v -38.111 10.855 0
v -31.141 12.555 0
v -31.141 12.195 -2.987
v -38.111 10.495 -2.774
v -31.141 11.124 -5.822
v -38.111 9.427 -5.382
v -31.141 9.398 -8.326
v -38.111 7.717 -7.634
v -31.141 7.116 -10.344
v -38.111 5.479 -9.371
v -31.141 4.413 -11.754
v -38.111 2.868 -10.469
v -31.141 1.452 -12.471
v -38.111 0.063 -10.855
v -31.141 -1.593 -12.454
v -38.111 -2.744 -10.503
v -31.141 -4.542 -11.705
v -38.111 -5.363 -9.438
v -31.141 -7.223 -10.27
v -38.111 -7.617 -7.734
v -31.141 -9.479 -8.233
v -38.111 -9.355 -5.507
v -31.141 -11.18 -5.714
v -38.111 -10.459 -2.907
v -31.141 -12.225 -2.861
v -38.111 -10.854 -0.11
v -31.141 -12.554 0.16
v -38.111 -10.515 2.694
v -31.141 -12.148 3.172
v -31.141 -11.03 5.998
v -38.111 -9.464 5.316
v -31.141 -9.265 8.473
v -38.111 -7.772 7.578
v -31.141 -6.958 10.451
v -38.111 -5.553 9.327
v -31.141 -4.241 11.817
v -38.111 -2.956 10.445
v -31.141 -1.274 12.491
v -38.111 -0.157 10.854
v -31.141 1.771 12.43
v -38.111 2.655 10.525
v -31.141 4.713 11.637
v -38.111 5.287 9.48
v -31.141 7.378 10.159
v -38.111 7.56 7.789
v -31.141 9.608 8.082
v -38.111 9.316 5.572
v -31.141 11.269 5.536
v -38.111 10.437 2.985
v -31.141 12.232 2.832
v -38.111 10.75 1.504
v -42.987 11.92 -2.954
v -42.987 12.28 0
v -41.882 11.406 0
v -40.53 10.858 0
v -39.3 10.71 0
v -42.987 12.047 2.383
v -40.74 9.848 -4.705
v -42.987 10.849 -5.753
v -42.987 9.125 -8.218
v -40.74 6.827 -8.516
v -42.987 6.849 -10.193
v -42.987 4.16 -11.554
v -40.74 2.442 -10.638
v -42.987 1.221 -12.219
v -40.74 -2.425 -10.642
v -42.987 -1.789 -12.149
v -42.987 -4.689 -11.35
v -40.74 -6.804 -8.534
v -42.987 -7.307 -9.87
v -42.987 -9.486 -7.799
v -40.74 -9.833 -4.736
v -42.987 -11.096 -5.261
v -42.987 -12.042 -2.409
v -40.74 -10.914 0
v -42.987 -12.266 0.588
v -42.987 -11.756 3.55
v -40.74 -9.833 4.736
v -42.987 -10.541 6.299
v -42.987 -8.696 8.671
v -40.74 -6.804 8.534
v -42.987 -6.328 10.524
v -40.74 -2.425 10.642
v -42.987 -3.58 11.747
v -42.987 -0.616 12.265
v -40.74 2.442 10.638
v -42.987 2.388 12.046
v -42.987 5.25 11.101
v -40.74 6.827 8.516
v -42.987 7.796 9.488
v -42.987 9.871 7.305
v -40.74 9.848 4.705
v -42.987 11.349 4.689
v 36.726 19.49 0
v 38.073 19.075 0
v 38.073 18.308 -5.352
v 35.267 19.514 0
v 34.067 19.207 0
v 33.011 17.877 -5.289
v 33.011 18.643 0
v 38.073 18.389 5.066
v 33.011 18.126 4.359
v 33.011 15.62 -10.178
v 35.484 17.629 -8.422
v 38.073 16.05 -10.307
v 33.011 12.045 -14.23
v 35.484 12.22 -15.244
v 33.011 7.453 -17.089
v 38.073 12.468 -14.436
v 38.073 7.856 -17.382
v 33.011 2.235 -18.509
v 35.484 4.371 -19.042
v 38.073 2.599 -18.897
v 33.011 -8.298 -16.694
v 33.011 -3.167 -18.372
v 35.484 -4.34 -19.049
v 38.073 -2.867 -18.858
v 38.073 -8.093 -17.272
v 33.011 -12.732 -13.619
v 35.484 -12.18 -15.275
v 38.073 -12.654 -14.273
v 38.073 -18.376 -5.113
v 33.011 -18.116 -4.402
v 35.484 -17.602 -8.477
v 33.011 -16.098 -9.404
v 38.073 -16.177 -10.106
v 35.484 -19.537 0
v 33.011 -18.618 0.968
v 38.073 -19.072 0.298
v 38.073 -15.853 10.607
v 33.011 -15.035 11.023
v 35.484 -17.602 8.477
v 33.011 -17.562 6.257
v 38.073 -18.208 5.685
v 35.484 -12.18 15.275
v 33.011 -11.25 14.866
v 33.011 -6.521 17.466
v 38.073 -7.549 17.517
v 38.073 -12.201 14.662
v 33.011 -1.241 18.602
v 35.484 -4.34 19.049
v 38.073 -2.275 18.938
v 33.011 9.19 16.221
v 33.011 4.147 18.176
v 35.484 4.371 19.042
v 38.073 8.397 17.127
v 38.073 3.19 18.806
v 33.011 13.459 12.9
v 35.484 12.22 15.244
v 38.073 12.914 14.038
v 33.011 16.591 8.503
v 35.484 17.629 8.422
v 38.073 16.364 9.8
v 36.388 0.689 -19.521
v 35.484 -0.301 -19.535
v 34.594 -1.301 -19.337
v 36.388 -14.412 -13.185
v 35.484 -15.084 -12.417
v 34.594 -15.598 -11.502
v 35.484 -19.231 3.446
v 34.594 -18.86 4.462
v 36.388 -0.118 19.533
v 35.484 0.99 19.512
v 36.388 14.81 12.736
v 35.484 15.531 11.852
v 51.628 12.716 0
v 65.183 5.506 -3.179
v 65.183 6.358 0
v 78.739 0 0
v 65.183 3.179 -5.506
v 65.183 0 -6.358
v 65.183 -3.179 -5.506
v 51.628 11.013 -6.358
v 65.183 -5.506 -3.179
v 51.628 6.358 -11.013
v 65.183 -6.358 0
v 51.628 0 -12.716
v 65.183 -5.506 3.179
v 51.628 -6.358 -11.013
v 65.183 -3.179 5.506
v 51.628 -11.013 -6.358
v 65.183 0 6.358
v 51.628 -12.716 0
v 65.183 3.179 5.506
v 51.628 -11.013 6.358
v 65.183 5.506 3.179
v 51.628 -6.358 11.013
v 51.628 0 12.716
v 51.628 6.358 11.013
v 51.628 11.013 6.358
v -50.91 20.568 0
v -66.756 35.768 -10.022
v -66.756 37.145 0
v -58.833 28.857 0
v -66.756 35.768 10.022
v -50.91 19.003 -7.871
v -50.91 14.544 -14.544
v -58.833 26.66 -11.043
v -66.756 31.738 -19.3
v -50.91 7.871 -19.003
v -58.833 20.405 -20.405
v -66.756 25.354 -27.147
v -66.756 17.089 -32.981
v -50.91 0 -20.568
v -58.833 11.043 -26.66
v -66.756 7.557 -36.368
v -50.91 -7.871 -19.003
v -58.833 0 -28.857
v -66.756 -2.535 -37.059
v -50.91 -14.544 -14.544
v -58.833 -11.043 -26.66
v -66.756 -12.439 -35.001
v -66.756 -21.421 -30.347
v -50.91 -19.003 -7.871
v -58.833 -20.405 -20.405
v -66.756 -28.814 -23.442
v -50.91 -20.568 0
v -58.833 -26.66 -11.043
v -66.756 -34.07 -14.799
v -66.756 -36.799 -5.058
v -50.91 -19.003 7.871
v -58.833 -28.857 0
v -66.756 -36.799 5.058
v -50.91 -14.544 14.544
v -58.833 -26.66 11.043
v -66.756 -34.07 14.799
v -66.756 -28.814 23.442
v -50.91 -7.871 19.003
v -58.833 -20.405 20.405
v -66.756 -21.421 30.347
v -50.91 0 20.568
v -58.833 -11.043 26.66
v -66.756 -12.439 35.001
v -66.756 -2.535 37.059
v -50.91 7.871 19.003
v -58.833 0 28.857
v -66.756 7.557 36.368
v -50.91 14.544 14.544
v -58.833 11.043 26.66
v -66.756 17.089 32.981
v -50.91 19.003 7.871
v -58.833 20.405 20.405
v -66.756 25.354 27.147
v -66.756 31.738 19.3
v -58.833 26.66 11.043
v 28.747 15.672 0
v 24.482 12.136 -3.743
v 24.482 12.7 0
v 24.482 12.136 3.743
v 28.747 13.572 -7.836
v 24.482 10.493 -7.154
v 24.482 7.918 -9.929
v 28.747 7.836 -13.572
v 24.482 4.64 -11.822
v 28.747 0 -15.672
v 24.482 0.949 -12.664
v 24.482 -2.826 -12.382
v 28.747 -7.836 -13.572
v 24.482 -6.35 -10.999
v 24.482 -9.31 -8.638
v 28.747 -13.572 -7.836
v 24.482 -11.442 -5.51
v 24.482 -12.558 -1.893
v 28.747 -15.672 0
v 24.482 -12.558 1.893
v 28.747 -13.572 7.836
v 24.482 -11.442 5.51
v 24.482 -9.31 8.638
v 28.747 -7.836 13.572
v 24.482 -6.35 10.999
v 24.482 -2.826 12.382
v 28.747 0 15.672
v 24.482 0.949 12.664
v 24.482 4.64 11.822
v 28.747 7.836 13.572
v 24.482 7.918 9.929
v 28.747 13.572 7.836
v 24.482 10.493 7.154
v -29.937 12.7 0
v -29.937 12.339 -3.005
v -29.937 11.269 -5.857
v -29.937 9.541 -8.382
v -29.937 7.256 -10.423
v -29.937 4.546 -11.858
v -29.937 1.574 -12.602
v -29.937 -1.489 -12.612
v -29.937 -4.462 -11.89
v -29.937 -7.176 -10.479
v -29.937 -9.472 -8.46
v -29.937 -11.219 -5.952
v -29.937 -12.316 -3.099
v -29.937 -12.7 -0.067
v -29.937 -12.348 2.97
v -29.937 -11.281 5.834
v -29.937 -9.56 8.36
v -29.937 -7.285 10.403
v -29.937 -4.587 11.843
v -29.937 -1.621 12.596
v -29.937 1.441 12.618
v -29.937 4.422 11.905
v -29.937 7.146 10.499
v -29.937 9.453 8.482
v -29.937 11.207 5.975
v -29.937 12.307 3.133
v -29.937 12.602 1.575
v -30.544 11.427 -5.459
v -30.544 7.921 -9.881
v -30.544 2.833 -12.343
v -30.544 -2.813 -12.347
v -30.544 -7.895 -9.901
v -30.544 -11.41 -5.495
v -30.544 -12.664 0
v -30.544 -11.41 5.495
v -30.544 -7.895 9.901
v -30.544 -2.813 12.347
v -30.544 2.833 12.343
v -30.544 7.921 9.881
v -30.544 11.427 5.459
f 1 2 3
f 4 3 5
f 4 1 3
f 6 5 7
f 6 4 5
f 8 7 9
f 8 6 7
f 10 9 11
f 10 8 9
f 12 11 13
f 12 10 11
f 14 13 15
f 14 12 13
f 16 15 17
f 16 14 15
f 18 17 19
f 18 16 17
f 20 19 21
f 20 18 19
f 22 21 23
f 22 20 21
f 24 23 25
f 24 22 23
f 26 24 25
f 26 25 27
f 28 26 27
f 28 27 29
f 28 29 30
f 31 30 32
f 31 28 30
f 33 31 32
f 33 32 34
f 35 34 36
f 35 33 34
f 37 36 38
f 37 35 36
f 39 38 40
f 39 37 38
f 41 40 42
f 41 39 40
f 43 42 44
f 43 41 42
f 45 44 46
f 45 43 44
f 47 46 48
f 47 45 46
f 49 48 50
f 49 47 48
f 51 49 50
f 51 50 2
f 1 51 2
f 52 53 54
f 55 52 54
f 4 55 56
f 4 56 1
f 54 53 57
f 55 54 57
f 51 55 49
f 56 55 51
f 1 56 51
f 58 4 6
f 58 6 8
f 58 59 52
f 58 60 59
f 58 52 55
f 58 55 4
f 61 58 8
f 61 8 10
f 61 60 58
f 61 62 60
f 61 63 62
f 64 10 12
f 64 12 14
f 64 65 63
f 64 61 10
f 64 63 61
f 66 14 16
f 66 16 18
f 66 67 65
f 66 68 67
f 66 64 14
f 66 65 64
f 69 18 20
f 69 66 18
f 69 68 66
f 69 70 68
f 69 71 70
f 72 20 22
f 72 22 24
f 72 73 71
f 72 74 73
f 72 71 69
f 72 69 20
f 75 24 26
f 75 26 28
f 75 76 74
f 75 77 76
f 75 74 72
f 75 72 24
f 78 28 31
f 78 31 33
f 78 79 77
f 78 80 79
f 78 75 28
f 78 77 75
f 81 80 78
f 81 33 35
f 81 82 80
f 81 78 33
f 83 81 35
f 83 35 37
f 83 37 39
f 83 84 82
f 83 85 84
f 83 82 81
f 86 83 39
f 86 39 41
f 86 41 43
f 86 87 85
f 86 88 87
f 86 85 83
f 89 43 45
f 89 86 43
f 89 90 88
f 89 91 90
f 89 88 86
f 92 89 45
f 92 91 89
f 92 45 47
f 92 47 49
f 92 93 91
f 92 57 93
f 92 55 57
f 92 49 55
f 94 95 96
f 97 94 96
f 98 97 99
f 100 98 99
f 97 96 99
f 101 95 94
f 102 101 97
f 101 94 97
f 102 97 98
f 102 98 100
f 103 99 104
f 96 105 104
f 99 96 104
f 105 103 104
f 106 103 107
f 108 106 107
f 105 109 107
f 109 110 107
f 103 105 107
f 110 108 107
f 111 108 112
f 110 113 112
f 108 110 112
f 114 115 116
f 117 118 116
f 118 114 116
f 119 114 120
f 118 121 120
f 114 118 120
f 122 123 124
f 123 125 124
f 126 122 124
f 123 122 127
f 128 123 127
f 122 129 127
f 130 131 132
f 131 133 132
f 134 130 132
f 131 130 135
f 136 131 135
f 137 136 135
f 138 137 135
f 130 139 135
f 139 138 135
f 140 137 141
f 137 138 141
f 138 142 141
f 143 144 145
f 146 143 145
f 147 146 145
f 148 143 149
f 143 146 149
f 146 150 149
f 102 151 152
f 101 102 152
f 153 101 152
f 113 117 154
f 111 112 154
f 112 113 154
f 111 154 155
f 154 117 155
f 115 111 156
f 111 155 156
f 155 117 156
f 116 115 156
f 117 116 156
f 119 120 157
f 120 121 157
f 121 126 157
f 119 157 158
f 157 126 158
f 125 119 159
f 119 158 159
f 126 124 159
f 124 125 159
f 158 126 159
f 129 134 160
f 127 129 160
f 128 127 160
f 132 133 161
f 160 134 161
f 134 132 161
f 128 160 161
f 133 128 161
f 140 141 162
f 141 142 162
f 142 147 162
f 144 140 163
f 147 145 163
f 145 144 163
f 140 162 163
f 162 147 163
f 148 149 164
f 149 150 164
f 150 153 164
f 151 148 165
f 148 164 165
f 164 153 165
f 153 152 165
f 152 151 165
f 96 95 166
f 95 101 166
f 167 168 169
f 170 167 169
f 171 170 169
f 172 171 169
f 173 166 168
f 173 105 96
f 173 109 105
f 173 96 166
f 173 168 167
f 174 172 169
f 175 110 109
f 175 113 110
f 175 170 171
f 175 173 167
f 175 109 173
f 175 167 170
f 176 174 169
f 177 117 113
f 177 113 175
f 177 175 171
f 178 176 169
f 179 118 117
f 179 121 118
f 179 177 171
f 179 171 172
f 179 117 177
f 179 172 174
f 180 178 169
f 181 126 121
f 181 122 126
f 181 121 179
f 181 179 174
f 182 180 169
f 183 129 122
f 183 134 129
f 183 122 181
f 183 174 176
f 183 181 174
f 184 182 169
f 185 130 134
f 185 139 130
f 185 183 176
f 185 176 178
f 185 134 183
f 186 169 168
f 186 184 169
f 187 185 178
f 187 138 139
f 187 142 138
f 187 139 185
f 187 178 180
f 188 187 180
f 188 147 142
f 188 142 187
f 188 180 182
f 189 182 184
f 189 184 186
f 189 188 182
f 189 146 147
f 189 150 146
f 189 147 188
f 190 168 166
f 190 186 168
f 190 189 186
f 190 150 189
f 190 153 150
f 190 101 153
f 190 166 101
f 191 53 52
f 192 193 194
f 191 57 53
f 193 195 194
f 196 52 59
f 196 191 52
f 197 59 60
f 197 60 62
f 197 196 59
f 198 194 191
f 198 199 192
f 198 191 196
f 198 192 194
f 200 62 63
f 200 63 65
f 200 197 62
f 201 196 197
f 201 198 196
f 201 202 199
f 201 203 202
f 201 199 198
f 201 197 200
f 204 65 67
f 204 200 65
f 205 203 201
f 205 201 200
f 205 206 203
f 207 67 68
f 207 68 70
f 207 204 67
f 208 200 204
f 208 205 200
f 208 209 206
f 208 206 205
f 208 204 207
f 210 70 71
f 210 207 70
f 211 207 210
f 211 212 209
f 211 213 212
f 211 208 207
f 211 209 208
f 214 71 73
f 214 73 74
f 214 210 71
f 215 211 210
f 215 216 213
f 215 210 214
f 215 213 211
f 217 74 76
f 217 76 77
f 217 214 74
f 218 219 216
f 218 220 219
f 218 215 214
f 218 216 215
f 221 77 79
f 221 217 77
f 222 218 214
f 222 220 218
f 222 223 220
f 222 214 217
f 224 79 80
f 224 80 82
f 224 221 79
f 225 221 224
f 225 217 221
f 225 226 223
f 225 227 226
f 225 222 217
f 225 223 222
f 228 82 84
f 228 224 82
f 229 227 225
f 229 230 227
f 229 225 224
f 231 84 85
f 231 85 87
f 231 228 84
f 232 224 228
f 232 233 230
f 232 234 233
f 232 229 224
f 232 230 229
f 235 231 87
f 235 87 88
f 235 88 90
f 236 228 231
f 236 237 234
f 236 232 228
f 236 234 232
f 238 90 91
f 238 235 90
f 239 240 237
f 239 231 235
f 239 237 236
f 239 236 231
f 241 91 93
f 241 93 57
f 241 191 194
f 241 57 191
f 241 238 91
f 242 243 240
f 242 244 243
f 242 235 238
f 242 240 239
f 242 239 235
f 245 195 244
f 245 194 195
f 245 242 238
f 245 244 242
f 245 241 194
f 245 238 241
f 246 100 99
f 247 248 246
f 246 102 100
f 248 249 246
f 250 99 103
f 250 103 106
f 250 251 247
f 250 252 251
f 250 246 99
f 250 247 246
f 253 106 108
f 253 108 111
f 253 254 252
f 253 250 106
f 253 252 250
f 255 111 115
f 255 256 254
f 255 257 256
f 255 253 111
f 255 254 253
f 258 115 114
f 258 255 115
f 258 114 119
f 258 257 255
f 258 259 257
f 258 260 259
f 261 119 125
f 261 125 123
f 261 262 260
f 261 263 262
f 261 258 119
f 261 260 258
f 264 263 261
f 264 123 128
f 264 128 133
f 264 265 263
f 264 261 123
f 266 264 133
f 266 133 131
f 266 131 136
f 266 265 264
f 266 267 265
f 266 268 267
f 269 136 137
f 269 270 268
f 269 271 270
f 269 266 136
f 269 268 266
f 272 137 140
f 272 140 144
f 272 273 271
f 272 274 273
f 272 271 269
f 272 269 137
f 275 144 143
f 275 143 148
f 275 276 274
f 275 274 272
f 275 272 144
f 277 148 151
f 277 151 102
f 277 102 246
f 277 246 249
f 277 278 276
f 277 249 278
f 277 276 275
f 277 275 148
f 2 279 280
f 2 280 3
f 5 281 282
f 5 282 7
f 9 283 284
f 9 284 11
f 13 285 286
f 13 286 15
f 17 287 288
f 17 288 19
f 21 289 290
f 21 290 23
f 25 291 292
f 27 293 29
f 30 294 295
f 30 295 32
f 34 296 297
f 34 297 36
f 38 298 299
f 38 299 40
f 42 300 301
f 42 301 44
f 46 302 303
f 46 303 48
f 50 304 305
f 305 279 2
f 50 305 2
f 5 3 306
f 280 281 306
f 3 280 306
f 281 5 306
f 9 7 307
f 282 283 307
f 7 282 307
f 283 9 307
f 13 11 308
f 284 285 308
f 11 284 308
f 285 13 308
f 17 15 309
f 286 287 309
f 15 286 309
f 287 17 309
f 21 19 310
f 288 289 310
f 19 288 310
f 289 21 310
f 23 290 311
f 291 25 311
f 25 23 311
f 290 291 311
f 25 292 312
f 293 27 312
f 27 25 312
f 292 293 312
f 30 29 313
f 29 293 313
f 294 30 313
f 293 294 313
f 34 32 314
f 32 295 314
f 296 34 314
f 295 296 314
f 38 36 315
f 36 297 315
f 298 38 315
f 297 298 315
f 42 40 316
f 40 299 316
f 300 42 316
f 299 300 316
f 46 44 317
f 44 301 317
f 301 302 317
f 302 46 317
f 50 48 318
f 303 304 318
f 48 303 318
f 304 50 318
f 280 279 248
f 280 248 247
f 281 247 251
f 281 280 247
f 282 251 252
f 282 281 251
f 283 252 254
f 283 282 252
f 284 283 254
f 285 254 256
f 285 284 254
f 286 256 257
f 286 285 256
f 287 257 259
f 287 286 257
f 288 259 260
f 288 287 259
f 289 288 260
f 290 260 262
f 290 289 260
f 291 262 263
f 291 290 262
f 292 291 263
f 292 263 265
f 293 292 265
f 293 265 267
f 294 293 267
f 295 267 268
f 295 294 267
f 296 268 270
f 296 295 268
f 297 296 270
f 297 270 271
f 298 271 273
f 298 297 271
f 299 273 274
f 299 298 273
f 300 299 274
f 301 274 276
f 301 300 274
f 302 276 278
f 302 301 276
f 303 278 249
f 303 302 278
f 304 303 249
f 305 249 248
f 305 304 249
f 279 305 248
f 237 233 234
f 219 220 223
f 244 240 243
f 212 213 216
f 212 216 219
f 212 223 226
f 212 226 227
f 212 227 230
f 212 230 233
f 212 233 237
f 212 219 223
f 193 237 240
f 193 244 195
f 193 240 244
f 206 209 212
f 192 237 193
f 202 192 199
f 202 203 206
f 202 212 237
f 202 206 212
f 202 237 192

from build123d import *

# Parameters (mm, degrees)
F2_R = 5.08


with BuildPart() as f1:
    # F0 (on Top) → F1 (revolve)
    with BuildSketch(Plane.XY):
        Polygon((-40.960705, 10.16), (-66.756062, 37.145256), (-66.756062, 0), (78.738996, 0), (35.417151, 20.32), (24.482426, 12.7), (-30.547943, 12.7), align=None)
    revolve(axis=Axis((5.991467, 0, 0), (-1, 0, 0)))

    # F2
    f2_edges = [f1.edges().sort_by_distance(p)[0] for p in [
        (-40.960705, -10.16, 0),
        (-30.547943, -12.7, 0),
        (35.417151, -20.32, 0),
    ]]
    fillet(f2_edges, radius=F2_R)


solid = f1.part
